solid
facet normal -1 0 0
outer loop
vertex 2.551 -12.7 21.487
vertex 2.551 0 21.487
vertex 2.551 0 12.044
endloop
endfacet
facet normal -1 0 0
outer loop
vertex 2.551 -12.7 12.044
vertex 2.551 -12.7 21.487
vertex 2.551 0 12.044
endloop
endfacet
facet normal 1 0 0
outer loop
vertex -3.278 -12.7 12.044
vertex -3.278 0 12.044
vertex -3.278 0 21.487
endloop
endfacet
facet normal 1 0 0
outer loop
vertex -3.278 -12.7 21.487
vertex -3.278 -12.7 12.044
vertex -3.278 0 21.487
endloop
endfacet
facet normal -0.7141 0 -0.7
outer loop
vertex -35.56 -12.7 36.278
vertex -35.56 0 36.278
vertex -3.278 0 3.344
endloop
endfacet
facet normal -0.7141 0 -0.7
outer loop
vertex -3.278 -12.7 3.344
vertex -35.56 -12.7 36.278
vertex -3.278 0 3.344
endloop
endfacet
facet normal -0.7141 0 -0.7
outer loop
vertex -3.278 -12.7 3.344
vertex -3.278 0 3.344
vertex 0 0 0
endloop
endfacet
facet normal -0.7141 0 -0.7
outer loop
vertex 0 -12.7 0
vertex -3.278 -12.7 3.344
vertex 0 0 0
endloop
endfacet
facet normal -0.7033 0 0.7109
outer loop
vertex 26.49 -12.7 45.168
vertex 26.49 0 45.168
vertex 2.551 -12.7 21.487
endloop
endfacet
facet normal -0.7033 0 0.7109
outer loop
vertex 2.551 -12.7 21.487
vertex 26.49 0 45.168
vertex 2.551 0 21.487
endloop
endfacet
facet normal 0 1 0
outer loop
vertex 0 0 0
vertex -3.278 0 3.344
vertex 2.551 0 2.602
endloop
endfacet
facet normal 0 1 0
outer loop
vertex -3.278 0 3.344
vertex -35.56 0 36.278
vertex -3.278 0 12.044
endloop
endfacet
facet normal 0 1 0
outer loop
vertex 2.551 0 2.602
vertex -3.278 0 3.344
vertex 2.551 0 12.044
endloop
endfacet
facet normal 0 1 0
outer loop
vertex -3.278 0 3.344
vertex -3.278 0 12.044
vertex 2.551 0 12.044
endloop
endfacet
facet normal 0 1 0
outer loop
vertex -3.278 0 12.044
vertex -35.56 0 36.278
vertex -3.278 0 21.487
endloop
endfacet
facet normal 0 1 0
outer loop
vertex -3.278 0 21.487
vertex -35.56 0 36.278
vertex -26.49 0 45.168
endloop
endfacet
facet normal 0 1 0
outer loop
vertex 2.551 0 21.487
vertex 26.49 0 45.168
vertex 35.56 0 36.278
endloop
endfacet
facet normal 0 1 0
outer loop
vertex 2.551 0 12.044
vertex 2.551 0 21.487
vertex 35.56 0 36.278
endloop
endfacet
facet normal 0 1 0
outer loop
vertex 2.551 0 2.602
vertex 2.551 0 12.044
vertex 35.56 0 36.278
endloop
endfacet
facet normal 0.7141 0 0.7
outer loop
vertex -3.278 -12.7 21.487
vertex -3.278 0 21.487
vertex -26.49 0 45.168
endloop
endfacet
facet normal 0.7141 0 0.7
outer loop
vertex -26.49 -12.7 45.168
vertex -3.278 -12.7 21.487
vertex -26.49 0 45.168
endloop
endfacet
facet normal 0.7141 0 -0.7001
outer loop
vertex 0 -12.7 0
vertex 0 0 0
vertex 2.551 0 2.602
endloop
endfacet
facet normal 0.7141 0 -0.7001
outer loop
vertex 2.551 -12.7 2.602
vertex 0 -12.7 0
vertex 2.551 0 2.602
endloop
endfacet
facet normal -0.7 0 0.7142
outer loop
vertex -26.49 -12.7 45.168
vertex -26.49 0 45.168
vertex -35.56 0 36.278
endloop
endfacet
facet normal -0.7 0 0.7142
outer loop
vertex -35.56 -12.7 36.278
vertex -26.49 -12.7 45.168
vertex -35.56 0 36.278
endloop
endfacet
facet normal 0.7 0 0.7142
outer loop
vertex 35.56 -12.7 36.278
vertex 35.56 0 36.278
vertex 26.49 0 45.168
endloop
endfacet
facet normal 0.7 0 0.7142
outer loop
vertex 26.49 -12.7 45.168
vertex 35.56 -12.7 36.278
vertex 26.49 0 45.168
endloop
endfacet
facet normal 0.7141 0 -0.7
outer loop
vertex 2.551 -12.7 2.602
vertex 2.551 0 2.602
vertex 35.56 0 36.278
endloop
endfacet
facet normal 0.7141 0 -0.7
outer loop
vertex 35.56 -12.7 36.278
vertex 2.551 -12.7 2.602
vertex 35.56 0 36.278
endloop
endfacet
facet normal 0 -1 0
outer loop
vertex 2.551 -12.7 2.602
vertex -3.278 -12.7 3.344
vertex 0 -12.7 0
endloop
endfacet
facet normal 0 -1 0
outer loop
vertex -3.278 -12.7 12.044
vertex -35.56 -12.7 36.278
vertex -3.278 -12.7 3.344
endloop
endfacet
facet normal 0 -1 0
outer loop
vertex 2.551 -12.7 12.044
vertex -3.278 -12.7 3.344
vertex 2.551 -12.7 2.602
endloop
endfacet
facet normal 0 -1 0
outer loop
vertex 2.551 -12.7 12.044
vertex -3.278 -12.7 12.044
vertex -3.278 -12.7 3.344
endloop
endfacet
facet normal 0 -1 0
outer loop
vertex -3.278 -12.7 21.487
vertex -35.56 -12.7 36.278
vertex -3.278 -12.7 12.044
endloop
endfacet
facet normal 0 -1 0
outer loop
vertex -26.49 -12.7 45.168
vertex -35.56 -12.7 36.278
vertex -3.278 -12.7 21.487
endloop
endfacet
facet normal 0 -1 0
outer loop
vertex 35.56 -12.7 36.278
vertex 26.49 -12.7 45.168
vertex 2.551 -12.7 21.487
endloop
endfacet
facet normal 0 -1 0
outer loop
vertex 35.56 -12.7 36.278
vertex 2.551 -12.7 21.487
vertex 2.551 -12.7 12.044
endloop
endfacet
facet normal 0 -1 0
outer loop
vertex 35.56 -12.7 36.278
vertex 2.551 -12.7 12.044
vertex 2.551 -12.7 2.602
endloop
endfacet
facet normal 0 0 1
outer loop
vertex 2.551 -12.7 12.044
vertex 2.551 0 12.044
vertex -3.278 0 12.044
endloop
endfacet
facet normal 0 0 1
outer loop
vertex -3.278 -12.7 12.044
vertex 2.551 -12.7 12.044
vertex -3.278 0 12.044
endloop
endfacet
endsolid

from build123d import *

# Parameters (mm, degrees)
F1_DEPTH = 12.7


with BuildPart() as f1:
    # F0 (on Front) → F1 (new body)
    with BuildSketch(Plane.XZ):
        Polygon((-26.490386, 45.168456), (-35.56, 36.278456), (-3.277726, 3.343949), (-3.277726, 12.044498), (-3.277726, 21.486806), align=None)
        Polygon((-3.277726, 12.044498), (-3.277726, 3.343949), (0, 0), (2.550656, 2.602189), (2.550656, 12.044498), align=None)
        Polygon((2.550656, 12.044498), (2.550656, 2.602189), (35.56, 36.278456), (26.490386, 45.168456), (2.550656, 21.486806), align=None)
    extrude(amount=F1_DEPTH)


solid = f1.part
